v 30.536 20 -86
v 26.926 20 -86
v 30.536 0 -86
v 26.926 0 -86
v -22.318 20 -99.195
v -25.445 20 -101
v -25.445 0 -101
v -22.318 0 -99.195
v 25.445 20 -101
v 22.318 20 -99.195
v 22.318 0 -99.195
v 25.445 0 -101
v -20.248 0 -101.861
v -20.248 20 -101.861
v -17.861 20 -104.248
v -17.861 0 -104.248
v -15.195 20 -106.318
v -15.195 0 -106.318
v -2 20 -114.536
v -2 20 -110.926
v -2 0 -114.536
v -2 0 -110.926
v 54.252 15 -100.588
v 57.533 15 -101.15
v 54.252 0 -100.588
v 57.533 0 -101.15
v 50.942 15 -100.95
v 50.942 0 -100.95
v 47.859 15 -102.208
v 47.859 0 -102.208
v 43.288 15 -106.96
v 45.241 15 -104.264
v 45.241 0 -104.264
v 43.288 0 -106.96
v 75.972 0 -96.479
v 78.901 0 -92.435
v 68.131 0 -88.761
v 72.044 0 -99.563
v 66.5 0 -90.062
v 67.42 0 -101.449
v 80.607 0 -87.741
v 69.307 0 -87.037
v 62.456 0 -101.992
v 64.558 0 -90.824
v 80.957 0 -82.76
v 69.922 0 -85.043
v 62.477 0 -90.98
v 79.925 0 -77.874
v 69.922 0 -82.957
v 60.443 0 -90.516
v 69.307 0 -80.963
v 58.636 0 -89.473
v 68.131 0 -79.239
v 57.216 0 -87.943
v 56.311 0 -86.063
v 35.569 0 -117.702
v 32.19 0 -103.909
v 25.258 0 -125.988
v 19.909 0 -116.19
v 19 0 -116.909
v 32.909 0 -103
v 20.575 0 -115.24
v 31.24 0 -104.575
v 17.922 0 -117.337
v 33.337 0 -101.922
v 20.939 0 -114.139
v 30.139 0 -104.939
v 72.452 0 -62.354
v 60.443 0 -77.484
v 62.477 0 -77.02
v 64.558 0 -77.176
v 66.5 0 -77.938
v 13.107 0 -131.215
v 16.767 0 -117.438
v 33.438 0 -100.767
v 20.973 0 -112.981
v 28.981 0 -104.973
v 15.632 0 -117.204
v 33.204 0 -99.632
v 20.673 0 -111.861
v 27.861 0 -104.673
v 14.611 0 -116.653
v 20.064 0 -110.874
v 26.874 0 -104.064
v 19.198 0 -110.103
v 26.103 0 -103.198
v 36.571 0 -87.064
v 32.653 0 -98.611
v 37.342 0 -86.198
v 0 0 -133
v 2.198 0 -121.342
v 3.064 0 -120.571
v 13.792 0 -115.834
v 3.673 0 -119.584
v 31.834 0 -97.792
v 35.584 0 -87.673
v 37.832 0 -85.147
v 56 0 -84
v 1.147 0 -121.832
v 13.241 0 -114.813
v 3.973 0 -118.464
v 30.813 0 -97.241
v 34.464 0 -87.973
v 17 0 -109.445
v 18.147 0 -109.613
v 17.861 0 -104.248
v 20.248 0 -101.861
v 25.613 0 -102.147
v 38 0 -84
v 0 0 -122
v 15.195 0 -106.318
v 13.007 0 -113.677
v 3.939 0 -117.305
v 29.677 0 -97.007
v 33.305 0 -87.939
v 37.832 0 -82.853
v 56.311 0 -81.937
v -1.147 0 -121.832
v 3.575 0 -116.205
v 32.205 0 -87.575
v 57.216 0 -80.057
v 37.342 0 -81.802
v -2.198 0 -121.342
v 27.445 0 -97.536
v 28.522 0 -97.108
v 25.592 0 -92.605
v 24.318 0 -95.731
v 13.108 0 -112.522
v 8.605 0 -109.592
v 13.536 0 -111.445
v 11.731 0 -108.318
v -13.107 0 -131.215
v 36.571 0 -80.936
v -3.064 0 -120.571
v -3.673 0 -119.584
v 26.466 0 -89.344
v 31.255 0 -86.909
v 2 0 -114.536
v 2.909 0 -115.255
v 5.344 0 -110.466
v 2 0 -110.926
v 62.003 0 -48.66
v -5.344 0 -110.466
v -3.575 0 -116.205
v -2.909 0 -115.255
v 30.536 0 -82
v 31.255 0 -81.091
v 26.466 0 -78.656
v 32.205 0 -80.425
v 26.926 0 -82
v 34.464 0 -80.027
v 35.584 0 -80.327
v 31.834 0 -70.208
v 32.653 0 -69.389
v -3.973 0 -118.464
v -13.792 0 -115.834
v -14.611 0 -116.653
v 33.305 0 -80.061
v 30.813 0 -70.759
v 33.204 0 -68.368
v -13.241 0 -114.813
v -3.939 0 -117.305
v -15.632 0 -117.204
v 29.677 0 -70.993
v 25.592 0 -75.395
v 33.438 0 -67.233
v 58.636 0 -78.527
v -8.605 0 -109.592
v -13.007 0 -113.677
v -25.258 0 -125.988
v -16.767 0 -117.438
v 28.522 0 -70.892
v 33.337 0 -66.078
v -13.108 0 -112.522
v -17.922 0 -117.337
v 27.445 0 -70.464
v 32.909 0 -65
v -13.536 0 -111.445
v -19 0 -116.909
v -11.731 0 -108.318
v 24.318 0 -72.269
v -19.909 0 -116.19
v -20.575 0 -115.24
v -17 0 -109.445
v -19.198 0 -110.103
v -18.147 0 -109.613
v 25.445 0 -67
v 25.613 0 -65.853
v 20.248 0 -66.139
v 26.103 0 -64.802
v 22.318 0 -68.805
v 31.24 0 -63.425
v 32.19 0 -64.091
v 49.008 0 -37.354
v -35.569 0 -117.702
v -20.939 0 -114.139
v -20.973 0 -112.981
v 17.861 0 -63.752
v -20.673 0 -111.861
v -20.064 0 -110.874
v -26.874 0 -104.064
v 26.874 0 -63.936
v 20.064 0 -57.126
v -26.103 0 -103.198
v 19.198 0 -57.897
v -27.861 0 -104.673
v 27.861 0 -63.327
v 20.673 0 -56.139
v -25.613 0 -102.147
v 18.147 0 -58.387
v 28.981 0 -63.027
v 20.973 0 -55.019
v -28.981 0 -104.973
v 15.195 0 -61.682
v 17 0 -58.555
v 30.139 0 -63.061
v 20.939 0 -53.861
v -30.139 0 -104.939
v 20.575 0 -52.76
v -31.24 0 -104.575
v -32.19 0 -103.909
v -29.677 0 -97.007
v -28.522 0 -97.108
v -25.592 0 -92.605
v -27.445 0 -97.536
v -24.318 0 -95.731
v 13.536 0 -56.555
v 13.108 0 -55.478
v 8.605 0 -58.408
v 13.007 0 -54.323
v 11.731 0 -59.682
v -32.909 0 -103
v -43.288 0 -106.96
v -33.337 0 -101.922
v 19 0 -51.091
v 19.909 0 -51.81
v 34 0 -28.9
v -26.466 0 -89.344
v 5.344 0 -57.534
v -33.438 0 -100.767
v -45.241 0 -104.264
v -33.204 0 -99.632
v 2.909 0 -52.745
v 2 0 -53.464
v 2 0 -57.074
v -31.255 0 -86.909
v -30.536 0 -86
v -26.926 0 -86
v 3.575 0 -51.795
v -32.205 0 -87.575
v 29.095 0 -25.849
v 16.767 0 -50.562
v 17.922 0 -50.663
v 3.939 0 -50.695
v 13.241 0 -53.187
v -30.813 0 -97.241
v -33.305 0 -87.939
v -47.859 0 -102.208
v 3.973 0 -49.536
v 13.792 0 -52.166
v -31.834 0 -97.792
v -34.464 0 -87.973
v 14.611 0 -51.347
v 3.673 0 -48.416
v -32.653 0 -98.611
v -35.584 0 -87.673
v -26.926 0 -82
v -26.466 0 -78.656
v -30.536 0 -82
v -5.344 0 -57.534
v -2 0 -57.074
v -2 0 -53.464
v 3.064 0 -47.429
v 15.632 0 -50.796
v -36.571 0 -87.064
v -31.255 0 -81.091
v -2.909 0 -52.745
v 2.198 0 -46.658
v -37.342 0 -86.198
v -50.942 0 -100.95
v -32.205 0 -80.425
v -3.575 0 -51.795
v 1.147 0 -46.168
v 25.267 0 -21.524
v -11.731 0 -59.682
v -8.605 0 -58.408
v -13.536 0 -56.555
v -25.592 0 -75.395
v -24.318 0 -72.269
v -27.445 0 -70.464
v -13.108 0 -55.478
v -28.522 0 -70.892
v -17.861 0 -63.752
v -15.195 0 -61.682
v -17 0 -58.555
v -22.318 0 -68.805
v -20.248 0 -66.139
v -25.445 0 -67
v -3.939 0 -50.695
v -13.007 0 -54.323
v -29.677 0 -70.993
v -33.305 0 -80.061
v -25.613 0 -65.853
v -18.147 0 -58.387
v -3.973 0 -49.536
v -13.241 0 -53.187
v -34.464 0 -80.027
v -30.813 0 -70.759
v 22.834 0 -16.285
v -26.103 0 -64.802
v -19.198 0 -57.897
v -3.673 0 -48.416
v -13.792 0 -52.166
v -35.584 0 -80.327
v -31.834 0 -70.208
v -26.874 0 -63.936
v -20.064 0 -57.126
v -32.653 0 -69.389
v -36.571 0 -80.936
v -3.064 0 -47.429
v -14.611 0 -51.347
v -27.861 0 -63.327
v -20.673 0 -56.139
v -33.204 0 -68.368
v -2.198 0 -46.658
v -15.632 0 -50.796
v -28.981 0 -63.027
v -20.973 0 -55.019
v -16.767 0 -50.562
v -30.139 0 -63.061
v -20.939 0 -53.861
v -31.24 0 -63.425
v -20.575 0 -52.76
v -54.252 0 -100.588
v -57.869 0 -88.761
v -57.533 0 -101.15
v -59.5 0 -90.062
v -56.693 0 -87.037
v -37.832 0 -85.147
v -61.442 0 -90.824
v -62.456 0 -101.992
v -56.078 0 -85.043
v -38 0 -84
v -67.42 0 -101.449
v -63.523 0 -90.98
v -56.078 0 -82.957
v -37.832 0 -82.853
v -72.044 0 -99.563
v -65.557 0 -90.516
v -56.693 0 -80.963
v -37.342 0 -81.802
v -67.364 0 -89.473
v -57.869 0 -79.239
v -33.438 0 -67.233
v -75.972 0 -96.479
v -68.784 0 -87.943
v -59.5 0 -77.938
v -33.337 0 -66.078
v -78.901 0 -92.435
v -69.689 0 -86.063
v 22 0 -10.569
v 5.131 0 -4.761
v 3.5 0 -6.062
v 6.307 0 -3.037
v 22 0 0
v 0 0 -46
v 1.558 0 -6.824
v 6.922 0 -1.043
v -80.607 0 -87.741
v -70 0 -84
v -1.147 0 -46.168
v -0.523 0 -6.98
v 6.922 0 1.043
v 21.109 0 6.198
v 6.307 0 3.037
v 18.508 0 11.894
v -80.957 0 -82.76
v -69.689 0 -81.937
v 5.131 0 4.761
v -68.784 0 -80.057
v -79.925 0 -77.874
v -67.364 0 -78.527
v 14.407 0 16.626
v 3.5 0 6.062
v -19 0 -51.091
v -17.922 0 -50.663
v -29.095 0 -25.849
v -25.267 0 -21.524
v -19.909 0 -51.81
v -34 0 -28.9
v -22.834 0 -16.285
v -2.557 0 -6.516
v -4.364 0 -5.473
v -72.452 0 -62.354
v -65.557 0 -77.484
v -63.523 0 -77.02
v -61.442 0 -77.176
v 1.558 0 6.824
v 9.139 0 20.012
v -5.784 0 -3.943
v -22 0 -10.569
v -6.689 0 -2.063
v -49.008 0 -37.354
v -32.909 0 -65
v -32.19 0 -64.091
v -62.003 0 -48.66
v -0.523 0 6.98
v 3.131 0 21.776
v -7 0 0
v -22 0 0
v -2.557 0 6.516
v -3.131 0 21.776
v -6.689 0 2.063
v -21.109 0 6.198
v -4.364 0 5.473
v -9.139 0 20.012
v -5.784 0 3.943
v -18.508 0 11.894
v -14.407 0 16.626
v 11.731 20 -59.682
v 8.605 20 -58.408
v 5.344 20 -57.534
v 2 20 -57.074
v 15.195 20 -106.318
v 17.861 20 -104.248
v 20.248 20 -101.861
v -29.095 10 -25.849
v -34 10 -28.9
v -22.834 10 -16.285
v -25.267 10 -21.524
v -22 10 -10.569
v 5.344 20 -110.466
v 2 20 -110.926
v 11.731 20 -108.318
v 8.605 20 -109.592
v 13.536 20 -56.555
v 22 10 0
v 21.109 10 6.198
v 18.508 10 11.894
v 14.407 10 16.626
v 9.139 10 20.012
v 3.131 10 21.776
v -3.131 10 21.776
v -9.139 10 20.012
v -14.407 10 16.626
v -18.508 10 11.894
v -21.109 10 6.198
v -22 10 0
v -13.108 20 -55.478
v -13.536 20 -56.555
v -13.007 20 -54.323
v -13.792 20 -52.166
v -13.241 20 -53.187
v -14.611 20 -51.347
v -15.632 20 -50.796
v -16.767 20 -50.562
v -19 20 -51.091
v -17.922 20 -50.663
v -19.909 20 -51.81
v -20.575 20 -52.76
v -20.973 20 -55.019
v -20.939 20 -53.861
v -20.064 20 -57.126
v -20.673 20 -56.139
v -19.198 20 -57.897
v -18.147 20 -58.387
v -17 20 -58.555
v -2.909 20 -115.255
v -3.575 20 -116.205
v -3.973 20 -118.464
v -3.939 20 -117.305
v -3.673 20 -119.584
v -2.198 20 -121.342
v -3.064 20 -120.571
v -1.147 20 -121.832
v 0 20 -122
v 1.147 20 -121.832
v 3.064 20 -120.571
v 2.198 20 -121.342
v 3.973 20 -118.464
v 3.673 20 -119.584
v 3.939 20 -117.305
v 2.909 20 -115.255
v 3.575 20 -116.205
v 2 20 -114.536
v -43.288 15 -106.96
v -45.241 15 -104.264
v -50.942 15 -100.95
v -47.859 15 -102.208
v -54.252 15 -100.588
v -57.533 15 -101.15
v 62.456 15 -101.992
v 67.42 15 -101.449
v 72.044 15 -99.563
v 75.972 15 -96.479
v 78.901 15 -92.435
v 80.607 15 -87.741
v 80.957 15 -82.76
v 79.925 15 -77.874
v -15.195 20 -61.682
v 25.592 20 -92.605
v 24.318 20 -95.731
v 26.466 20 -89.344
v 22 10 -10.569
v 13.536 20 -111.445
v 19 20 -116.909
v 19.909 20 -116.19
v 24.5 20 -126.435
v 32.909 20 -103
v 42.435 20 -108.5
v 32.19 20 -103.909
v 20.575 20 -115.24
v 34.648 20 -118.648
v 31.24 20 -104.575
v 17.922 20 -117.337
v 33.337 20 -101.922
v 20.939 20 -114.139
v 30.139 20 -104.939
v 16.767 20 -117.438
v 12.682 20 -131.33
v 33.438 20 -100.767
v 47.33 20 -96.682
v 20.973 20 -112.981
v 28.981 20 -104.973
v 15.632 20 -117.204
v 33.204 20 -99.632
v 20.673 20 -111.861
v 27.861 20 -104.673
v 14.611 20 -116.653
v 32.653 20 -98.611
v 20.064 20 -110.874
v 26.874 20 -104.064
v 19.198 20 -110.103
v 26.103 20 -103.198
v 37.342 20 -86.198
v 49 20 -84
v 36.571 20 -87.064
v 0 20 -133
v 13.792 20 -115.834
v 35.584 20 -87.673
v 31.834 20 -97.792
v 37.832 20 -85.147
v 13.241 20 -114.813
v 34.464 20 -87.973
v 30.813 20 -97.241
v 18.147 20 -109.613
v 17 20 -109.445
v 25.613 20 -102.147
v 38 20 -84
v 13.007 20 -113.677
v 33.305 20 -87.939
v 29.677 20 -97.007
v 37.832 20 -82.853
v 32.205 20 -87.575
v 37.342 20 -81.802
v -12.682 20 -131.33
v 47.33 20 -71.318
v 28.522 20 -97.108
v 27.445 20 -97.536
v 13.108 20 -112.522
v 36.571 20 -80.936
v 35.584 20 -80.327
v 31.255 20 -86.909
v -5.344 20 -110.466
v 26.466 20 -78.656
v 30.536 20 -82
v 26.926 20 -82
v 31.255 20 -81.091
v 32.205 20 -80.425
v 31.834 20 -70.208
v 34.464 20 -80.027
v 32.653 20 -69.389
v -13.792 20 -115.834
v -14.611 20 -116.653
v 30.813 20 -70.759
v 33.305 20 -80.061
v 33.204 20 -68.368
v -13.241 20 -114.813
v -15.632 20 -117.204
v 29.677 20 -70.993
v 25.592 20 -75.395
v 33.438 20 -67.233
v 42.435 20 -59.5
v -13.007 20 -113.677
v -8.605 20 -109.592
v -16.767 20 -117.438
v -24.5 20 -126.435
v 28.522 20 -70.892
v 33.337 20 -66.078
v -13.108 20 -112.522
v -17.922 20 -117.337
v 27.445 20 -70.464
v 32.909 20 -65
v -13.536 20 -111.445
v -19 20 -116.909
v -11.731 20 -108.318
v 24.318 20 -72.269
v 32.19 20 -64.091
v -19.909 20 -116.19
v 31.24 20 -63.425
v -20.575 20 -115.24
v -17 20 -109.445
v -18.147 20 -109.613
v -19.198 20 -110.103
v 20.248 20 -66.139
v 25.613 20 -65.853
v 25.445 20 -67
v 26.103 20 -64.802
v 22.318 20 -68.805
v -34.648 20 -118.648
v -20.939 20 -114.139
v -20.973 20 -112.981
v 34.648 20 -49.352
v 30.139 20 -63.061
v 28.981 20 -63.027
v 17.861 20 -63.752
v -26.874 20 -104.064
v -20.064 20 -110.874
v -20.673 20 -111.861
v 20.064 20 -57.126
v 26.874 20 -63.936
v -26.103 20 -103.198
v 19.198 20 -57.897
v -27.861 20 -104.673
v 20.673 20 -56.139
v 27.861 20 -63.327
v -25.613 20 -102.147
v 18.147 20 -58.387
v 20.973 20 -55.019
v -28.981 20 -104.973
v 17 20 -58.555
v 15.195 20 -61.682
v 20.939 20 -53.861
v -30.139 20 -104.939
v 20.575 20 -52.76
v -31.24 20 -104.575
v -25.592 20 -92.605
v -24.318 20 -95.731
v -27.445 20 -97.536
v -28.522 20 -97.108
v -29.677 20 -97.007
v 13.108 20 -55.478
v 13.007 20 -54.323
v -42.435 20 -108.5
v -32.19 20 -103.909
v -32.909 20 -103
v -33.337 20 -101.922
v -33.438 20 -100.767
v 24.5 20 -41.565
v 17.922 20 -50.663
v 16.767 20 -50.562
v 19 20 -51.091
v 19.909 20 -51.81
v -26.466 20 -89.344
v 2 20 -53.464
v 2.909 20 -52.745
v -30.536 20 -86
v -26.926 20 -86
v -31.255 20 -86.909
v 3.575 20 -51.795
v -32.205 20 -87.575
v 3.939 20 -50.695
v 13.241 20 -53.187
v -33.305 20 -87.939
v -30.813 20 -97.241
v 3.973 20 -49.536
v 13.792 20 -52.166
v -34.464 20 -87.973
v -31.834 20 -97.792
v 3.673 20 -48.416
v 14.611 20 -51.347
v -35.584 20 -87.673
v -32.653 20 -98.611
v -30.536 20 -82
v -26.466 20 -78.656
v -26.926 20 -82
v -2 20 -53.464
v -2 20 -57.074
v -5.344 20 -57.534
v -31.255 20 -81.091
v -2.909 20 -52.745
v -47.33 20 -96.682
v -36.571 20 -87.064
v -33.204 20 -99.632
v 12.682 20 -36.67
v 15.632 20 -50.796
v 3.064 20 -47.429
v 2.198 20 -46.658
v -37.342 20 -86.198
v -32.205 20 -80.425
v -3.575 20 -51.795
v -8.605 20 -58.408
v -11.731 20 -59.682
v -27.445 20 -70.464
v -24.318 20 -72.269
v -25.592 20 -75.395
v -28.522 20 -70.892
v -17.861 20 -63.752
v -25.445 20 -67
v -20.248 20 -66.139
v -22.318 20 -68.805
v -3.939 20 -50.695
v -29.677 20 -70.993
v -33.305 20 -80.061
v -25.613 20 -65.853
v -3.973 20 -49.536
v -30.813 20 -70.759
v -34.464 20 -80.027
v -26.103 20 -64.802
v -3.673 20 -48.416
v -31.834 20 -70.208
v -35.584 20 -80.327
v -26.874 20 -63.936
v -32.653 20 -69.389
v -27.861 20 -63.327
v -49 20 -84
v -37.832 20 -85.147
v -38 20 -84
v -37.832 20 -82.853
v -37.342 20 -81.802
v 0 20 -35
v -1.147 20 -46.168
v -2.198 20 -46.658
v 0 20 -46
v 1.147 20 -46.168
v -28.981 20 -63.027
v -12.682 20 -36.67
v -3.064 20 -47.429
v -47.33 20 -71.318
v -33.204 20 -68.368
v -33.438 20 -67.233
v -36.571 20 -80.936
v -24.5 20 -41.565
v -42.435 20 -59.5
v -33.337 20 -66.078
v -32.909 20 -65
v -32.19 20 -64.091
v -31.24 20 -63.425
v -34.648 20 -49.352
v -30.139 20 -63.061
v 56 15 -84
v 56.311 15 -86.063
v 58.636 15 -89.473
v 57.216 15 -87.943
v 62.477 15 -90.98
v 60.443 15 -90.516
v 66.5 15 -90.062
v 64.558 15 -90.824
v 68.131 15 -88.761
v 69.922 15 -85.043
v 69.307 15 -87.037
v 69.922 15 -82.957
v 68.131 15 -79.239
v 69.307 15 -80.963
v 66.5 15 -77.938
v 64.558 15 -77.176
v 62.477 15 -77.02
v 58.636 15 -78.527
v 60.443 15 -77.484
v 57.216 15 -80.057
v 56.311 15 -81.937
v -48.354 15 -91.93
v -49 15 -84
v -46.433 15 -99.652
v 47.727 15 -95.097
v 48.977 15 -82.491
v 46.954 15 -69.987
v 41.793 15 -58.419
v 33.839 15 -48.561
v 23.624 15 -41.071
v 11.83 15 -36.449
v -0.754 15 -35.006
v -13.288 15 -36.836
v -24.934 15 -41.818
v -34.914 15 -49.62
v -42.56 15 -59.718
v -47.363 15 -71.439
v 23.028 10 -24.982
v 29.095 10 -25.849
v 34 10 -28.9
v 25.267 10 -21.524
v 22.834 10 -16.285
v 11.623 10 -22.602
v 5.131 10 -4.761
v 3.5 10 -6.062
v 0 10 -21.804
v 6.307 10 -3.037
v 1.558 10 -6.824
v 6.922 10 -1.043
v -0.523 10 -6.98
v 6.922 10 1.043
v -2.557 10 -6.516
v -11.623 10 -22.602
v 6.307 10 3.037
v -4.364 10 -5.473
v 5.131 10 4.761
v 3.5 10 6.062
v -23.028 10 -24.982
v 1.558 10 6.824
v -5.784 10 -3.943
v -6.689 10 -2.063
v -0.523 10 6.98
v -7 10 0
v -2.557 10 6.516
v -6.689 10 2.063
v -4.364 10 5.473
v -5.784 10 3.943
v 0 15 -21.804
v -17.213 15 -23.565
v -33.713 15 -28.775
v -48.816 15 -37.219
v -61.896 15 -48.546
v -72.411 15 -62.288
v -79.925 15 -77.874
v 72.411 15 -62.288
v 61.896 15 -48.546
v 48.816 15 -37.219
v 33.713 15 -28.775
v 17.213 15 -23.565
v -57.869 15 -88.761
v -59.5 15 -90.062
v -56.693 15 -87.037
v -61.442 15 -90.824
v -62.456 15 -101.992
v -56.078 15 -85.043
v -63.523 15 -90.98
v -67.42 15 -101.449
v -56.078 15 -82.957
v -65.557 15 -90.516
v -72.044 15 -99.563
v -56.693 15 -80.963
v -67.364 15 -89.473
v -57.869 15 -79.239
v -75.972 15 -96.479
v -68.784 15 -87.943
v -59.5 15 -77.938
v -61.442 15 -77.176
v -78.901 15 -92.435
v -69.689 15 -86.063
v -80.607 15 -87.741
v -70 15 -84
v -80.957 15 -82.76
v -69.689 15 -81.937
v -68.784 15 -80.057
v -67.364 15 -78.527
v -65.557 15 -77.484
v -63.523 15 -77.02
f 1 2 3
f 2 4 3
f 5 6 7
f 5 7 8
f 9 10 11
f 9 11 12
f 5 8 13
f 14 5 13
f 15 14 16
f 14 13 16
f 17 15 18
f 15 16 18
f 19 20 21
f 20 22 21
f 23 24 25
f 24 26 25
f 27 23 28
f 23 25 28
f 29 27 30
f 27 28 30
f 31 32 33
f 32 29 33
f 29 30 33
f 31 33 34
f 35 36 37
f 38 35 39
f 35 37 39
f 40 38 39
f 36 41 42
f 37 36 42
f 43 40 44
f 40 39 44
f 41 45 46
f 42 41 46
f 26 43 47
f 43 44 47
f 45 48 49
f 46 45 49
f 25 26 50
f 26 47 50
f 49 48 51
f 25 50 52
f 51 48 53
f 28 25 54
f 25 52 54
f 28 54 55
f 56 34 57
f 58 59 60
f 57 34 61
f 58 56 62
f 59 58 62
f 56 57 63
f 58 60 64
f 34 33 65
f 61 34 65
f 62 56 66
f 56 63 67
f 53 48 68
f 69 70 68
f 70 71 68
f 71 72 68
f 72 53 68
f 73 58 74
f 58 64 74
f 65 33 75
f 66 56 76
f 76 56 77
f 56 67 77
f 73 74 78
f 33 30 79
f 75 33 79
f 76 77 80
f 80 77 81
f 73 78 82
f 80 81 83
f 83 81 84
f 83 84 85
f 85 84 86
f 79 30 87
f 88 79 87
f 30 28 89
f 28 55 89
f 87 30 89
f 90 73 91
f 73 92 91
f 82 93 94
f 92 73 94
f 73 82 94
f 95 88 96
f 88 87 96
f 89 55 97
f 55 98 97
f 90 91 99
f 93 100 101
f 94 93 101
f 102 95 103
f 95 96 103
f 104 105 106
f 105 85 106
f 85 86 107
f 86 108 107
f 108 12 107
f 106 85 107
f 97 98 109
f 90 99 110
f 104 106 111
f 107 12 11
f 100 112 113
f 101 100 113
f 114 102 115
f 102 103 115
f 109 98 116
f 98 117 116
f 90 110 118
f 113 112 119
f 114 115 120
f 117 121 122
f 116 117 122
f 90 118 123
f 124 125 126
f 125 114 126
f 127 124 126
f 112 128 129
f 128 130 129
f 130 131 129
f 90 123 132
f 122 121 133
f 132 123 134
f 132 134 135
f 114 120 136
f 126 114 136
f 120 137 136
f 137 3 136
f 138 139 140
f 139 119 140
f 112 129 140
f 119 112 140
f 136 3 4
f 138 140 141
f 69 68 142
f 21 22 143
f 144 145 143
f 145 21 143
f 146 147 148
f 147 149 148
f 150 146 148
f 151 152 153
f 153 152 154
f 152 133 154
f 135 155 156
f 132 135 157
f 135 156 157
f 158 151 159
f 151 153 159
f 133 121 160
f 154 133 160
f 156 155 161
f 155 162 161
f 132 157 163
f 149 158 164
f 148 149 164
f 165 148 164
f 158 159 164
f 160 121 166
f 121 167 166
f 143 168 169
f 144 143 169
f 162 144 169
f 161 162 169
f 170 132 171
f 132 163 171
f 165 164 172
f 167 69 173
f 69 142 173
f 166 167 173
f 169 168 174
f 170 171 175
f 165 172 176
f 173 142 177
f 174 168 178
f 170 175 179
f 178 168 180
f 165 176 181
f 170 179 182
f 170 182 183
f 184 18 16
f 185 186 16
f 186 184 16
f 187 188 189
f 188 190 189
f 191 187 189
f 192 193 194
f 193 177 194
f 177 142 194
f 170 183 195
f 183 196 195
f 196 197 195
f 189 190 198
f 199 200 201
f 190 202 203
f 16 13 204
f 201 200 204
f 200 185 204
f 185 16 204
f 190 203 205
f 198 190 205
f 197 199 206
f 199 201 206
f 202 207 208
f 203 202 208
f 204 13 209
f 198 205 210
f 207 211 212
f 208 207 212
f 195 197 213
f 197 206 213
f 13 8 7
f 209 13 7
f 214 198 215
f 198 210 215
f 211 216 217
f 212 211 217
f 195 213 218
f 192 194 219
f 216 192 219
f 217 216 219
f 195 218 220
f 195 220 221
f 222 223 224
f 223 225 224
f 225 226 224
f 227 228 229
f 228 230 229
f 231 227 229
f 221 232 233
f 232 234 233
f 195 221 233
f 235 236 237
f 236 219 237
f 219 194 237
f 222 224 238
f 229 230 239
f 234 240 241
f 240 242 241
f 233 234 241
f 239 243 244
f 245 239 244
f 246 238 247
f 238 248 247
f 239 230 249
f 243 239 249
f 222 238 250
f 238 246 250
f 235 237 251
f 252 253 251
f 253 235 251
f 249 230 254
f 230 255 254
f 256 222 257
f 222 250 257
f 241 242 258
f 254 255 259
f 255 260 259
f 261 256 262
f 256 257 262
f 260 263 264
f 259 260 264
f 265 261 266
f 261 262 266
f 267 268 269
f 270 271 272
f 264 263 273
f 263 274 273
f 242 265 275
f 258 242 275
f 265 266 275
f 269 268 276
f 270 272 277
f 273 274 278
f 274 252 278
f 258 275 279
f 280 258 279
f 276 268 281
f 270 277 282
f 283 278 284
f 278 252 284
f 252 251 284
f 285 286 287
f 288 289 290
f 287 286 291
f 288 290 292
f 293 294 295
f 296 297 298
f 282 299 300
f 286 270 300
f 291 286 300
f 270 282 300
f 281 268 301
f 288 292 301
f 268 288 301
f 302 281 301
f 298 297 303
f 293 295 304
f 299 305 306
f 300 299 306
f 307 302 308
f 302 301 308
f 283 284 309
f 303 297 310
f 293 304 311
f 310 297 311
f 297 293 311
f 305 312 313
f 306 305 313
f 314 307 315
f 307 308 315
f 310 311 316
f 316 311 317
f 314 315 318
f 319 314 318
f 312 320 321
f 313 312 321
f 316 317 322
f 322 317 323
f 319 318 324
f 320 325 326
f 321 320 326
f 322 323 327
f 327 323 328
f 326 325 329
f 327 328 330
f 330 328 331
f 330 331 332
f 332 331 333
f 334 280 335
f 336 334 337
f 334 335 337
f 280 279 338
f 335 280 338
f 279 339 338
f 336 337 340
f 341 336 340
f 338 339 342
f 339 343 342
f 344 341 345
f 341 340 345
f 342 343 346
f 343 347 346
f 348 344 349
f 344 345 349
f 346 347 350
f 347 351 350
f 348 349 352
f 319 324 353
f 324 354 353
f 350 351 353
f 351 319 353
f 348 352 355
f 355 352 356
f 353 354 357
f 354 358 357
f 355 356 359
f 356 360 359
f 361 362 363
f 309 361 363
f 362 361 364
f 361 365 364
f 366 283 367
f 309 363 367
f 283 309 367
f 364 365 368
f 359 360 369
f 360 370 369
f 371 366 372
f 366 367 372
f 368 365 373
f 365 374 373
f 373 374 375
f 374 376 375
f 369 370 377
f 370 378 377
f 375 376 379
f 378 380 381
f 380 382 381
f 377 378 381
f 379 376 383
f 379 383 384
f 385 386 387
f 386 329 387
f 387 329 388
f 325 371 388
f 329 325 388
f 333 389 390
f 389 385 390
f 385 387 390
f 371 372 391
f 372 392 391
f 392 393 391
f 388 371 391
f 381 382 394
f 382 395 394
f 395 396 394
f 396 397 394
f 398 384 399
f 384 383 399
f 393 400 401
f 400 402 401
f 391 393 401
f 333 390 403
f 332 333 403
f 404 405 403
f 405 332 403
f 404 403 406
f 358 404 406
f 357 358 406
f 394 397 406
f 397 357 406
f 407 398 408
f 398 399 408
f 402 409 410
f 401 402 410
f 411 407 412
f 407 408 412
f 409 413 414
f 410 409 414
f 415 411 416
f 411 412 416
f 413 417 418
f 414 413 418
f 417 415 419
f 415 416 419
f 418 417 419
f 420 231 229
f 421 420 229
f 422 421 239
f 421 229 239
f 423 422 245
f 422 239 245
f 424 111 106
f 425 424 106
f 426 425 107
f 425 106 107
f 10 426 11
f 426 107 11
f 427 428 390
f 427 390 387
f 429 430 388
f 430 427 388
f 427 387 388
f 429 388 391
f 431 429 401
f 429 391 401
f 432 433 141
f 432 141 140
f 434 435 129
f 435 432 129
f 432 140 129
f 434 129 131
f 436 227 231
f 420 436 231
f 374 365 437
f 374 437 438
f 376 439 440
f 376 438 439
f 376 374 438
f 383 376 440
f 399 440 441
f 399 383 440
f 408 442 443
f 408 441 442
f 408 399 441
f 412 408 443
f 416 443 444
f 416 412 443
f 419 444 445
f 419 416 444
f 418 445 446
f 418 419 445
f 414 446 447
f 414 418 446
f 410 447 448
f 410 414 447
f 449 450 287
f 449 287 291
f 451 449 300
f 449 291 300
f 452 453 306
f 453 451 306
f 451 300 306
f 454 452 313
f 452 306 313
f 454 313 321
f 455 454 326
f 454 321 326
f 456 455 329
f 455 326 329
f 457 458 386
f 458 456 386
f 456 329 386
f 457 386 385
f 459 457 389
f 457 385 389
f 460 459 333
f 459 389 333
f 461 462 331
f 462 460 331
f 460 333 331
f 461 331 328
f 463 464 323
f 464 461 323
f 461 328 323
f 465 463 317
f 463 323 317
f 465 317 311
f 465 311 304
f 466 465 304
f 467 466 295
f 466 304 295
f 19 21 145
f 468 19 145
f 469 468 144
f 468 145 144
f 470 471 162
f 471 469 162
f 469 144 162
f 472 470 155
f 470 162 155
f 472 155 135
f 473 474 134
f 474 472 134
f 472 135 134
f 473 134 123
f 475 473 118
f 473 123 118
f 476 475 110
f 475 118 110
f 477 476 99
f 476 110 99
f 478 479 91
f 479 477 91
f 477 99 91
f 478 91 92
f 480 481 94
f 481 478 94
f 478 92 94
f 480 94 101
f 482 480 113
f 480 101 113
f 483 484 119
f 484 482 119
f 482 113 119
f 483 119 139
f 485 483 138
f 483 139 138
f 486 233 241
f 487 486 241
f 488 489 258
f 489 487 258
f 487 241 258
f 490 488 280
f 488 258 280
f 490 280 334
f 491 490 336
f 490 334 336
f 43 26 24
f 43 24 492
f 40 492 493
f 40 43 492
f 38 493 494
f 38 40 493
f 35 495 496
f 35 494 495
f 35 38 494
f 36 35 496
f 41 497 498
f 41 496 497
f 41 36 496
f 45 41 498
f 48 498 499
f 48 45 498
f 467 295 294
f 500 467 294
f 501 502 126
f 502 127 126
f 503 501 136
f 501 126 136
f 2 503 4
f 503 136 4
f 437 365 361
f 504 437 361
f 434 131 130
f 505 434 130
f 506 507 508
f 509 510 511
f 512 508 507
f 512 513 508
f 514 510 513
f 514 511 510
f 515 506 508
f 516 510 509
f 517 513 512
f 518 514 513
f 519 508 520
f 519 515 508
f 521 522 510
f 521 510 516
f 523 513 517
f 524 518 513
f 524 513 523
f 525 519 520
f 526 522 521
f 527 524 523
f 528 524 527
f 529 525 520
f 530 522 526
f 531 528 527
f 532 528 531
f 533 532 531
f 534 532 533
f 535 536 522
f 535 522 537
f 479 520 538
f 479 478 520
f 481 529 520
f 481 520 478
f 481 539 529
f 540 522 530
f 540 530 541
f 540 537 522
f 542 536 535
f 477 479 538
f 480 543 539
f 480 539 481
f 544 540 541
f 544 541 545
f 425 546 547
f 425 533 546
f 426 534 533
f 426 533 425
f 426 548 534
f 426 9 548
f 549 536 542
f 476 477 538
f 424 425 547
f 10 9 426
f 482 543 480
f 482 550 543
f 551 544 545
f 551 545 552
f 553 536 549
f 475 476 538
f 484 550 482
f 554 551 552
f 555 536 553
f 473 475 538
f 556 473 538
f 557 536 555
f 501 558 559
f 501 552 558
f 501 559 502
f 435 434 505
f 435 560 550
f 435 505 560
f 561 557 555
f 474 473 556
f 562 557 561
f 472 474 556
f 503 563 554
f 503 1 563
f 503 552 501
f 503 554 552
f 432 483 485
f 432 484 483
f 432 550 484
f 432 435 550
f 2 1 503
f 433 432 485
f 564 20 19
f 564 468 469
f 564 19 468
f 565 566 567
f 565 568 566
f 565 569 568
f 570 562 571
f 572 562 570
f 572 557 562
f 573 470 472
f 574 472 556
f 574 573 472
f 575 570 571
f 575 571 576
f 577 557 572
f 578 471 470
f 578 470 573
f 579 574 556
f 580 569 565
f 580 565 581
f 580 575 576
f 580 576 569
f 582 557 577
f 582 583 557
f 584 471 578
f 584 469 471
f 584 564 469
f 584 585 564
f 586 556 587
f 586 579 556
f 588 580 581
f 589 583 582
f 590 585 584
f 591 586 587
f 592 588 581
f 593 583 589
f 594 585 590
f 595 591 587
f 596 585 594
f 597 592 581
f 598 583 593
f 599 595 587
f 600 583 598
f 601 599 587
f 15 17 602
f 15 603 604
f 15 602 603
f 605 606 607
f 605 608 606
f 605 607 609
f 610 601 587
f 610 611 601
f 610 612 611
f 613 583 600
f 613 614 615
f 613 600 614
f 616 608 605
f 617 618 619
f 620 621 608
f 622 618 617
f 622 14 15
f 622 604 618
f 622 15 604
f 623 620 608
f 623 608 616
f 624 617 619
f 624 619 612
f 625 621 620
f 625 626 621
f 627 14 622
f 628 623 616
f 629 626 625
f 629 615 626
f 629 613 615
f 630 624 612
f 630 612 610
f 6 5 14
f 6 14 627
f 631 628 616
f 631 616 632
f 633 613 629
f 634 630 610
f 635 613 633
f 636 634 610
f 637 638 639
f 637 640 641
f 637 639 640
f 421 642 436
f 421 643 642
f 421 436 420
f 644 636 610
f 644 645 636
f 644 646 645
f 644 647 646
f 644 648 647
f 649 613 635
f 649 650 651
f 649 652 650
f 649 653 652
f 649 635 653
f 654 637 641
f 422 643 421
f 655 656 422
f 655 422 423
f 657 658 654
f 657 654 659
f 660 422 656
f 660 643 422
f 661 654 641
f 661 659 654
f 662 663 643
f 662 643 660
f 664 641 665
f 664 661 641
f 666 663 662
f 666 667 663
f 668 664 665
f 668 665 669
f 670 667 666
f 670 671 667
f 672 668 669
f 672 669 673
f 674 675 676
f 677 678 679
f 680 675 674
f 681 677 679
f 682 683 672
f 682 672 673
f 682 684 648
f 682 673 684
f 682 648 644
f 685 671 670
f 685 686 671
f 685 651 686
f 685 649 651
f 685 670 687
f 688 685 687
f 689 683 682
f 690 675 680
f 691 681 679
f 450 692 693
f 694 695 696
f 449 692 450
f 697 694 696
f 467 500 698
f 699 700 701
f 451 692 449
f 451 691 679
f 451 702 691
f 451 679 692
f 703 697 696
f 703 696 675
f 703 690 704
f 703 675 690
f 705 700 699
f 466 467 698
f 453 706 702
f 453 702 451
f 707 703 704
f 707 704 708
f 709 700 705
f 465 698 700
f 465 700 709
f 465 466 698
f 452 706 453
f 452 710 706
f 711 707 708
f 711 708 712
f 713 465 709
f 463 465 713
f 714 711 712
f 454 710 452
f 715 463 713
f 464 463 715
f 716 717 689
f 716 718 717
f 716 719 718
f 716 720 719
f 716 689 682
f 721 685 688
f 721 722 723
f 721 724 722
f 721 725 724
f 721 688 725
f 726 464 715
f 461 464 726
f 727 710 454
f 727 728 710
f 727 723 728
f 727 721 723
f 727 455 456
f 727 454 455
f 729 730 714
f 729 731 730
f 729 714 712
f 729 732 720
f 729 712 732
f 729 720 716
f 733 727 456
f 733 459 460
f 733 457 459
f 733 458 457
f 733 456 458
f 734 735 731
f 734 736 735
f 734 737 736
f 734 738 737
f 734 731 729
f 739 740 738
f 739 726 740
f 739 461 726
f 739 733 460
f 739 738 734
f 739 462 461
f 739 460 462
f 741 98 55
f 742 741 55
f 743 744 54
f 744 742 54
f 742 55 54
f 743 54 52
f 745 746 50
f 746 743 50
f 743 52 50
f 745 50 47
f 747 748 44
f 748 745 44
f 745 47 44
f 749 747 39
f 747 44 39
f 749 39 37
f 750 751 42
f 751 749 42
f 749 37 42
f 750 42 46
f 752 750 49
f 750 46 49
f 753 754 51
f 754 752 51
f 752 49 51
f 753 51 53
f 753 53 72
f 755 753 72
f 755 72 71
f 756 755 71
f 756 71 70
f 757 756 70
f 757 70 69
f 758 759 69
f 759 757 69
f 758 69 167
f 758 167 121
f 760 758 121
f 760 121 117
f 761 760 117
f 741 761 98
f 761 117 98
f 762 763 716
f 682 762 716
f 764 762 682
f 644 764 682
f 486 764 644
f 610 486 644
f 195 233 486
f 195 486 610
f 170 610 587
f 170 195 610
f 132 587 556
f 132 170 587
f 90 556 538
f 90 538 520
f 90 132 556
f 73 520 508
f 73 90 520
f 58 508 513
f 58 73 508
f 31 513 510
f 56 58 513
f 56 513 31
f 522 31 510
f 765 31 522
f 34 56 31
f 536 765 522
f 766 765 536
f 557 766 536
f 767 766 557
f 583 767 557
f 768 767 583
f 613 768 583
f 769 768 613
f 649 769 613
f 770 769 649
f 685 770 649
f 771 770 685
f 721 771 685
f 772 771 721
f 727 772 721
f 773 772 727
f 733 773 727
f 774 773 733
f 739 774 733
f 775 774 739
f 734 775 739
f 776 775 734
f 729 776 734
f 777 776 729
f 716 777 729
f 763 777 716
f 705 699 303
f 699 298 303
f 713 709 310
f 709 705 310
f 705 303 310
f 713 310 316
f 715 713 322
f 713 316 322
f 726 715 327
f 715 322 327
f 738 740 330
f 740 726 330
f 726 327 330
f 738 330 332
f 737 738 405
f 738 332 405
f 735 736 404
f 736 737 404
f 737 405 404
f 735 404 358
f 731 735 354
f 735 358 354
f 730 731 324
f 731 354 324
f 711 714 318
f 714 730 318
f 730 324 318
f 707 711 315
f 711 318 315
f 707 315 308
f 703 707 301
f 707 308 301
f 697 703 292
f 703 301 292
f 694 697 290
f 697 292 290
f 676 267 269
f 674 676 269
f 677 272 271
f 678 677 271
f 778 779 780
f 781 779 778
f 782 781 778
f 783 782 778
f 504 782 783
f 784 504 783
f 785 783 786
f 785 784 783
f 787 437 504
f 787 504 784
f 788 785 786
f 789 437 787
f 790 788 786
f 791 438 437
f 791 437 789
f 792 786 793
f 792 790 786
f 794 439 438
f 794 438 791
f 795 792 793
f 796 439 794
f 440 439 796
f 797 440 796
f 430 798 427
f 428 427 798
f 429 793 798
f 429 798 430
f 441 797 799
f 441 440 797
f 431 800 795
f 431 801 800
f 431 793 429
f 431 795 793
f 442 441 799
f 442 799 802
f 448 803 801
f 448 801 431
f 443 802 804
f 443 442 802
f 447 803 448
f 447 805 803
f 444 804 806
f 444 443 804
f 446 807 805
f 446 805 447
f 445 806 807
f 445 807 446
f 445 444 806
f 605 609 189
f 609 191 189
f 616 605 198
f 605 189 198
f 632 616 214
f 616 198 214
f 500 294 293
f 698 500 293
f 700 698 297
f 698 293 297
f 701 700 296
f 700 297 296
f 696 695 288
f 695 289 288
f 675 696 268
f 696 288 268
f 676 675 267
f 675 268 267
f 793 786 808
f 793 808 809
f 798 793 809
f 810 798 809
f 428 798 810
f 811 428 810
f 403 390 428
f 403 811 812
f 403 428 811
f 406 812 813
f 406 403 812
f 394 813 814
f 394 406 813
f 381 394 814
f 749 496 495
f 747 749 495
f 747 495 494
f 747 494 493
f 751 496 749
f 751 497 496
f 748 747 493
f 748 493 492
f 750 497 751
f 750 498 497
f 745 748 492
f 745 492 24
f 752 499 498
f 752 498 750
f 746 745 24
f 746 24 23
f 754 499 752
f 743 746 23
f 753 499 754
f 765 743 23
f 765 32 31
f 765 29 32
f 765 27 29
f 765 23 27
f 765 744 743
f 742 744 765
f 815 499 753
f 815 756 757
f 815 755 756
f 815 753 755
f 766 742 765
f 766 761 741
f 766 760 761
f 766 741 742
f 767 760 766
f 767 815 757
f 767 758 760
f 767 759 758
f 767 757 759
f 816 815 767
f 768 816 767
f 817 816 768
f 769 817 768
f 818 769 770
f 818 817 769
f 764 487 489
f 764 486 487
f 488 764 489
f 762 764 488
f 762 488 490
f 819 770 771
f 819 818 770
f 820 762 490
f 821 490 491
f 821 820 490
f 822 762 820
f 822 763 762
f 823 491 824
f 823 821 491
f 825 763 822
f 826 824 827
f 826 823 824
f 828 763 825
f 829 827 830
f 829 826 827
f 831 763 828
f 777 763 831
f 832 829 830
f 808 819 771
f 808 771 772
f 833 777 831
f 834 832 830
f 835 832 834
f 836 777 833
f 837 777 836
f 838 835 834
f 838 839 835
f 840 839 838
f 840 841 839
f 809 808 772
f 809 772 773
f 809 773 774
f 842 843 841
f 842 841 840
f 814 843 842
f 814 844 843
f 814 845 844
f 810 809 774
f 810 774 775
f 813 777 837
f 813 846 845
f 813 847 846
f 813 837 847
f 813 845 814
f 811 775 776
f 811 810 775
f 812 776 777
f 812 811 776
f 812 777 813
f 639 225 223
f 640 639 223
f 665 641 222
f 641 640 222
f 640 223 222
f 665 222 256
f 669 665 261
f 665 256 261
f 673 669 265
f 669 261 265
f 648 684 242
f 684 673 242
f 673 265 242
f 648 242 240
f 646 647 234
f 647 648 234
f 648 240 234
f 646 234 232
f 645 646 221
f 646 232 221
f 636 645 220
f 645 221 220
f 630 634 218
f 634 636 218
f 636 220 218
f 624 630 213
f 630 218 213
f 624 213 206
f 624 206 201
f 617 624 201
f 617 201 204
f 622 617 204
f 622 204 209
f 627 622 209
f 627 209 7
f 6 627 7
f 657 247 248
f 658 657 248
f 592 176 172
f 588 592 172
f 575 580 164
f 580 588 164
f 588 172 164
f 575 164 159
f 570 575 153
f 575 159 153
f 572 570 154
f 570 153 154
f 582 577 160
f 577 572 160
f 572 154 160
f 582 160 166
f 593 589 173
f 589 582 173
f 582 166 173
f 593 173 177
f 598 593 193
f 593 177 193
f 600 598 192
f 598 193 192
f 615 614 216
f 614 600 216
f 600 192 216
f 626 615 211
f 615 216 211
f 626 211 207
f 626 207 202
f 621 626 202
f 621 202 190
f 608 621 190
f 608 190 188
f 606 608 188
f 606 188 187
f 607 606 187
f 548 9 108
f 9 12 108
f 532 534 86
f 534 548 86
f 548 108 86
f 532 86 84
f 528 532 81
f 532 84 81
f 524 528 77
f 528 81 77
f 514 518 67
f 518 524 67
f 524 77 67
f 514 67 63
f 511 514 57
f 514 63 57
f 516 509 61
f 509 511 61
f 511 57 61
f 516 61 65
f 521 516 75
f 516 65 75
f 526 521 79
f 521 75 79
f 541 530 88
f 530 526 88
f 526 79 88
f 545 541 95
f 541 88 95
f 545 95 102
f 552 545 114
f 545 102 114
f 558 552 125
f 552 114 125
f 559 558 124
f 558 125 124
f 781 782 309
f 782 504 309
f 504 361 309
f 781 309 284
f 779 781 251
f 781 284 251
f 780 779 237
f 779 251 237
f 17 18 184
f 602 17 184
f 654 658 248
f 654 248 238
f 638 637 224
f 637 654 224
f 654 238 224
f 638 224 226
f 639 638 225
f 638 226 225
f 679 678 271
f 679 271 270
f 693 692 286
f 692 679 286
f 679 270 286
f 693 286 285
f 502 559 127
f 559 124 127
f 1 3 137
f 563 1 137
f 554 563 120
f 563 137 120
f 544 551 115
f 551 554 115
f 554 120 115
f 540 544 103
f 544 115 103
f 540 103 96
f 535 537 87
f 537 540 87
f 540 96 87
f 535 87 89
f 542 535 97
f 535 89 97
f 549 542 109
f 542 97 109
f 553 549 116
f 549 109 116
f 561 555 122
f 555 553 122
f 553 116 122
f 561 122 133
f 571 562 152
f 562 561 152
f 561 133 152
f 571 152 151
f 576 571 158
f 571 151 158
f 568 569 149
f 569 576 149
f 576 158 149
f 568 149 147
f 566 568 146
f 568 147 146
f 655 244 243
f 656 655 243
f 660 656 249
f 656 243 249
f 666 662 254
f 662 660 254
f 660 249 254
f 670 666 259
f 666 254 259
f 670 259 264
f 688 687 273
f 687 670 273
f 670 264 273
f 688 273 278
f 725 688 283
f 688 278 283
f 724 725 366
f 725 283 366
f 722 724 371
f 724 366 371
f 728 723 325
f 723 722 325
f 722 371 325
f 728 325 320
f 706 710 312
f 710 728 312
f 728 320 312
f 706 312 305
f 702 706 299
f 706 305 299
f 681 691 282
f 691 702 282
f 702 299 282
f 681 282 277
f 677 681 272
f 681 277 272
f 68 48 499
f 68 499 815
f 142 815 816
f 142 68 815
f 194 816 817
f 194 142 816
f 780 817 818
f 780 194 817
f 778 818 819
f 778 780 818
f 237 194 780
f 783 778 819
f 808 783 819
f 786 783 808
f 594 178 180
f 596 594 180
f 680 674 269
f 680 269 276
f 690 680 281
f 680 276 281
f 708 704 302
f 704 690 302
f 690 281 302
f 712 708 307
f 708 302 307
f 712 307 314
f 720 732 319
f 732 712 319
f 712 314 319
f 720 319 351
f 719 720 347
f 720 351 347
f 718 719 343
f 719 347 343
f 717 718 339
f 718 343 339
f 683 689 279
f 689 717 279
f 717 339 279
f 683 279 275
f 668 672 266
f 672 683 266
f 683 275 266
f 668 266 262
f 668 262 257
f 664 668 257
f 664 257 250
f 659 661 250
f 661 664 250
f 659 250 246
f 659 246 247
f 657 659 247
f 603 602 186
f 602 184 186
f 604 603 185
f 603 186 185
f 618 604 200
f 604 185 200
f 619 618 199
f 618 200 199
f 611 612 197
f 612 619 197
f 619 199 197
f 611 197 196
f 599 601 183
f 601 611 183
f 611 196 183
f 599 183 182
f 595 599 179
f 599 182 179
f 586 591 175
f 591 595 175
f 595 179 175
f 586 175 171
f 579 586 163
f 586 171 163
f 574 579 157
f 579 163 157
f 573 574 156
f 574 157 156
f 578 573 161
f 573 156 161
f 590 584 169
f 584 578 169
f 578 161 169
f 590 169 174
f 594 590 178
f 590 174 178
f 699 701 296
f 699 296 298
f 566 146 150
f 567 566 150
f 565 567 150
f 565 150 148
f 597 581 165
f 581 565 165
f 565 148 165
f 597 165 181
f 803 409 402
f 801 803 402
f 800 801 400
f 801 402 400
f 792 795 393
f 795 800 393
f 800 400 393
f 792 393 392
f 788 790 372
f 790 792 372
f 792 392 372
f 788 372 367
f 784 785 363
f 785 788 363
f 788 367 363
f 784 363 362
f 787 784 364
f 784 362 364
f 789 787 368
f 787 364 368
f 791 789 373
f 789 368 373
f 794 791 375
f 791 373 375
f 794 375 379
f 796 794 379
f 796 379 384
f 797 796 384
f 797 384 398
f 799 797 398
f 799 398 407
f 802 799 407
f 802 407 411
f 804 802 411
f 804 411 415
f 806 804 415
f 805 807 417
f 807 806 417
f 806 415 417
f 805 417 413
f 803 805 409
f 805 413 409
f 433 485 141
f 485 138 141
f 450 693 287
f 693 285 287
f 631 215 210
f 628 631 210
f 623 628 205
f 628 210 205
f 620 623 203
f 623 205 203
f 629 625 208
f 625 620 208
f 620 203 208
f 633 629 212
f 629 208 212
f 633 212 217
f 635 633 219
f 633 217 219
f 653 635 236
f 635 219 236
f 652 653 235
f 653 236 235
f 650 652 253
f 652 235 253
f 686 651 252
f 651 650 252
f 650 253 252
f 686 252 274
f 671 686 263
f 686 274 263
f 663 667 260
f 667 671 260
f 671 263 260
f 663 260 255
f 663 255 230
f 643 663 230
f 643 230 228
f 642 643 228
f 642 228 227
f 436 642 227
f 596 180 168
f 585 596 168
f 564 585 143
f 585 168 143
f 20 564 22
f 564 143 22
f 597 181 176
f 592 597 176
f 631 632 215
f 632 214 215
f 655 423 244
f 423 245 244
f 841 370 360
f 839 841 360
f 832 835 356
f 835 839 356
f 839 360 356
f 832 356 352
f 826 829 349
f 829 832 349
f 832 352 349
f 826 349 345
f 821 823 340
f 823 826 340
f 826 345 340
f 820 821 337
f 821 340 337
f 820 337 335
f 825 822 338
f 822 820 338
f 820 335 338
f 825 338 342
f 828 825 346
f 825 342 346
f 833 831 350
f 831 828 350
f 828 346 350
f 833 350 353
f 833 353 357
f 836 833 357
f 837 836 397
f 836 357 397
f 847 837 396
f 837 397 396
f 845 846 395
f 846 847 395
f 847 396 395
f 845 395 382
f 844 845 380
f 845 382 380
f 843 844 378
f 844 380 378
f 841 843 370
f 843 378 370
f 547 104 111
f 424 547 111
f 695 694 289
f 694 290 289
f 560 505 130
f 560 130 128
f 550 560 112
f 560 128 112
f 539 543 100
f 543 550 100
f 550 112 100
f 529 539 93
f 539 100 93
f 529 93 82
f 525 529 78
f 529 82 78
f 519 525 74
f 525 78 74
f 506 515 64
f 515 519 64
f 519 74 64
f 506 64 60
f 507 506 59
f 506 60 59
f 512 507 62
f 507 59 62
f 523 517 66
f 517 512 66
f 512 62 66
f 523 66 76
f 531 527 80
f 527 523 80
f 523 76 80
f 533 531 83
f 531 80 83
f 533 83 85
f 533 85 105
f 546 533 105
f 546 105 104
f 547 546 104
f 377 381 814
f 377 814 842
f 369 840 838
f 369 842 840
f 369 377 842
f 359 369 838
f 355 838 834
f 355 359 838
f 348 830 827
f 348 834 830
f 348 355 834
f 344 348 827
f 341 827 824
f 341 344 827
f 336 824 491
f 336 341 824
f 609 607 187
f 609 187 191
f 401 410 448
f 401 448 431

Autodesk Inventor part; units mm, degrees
ref_plane "YZ Plane" through (0, 0, 0) normal (1, 0, 0) x (0, 1, 0)
ref_plane "XZ Plane" through (0, 0, 0) normal (0, 1, 0) x (-1, 0, 0)
ref_plane "XY Plane" through (0, 0, 0) normal (0, 0, 1) x (1, 0, 0)
sketch "Sketch1" plane through (0, 0, 0) normal (0, 1, 0) x (-1, 0, 0)
  circle A0 centre (0, 0) radius 7
  arc A1 (22, 0) -> (-22, 0) centre (0, 0) ccw
  line L0 (0, 0) -> (0, -84) construction
  circle A2 centre (0, -84) radius 49
  arc A3 (30.5359, -86) -> (30.5359, -82) centre (34, -84) ccw
  line L1 (26.9258, -82) -> (30.5359, -82)
  line L2 (30.5359, -86) -> (26.9258, -86)
  line L3 (26.9258, -82) -> (30.5359, -86) construction
  line L4 (30.5359, -82) -> (26.9258, -86) construction
  line L5 (27.4449, -70.4641) -> (24.3184, -72.2691)
  arc A4 (27.4449, -70.4641) -> (25.4449, -67) centre (29.4449, -67) ccw
  line L6 (22.3184, -68.805) -> (25.4449, -67)
  line L7 (17, -58.5551) -> (15.195, -61.6816)
  arc A5 (17, -58.5551) -> (13.5359, -56.5551) centre (17, -54.5551) ccw
  line L8 (11.7309, -59.6816) -> (13.5359, -56.5551)
  line L9 (2, -53.4641) -> (2, -57.0742)
  arc A6 (2, -53.4641) -> (-2, -53.4641) centre (0, -50) ccw
  line L10 (-2, -57.0742) -> (-2, -53.4641)
  line L11 (-13.5359, -56.5551) -> (-11.7309, -59.6816)
  arc A7 (-13.5359, -56.5551) -> (-17, -58.5551) centre (-17, -54.5551) ccw
  line L12 (-15.195, -61.6816) -> (-17, -58.5551)
  line L13 (-25.4449, -67) -> (-22.3184, -68.805)
  arc A8 (-25.4449, -67) -> (-27.4449, -70.4641) centre (-29.4449, -67) ccw
  line L14 (-24.3184, -72.2691) -> (-27.4449, -70.4641)
  line L15 (-30.5359, -82) -> (-26.9258, -82)
  arc A9 (-30.5359, -82) -> (-30.5359, -86) centre (-34, -84) ccw
  line L16 (-26.9258, -86) -> (-30.5359, -86)
  line L17 (-27.4449, -97.5359) -> (-24.3184, -95.7309)
  arc A10 (-27.4449, -97.5359) -> (-25.4449, -101) centre (-29.4449, -101) ccw
  line L18 (-22.3184, -99.195) -> (-25.4449, -101)
  line L19 (-17, -109.4449) -> (-15.195, -106.3184)
  arc A11 (-17, -109.4449) -> (-13.5359, -111.4449) centre (-17, -113.4449) ccw
  line L20 (-11.7309, -108.3184) -> (-13.5359, -111.4449)
  line L21 (-2, -114.5359) -> (-2, -110.9258)
  arc A12 (-2, -114.5359) -> (2, -114.5359) centre (0, -118) ccw
  line L22 (2, -110.9258) -> (2, -114.5359)
  line L23 (13.5359, -111.4449) -> (11.7309, -108.3184)
  arc A13 (13.5359, -111.4449) -> (17, -109.4449) centre (17, -113.4449) ccw
  line L24 (15.195, -106.3184) -> (17, -109.4449)
  line L25 (25.4449, -101) -> (22.3184, -99.195)
  arc A14 (25.4449, -101) -> (27.4449, -97.5359) centre (29.4449, -101) ccw
  line L26 (24.3184, -95.7309) -> (27.4449, -97.5359)
  circle A15 centre (63, -84) radius 7
  arc A16 (57.5333, -101.1498) -> (79.9254, -77.8737) centre (63, -84) ccw
  arc A17 (57.5333, -101.1498) -> (43.2878, -106.9601) centre (53.8889, -112.583) ccw
  arc A18 (79.9254, -77.8737) -> (0, -21.8035) centre (0, -106.8035) ccw
  line L27 (22, 0) -> (22, -10.5694)
  arc A19 (22, -10.5694) -> (34, -28.8997) centre (42, -10.5694) ccw
  circle A20 centre (-63, -84) radius 7
  arc A21 (-79.9254, -77.8737) -> (-57.5333, -101.1498) centre (-63, -84) ccw
  arc A22 (-43.2878, -106.9601) -> (-57.5333, -101.1498) centre (-53.8889, -112.583) ccw
  arc A23 (0, -21.8035) -> (-79.9254, -77.8737) centre (0, -106.8035) ccw
  line L28 (-22, 0) -> (-22, -10.5694)
  arc A24 (-34, -28.8997) -> (-22, -10.5694) centre (-42, -10.5694) ccw
  arc A25 (24.3184, -95.7309) -> (26.9258, -86) centre (0, -84) ccw
  arc A26 (15.195, -106.3184) -> (22.3184, -99.195) centre (0, -84) ccw
  arc A27 (2, -110.9258) -> (11.7309, -108.3184) centre (0, -84) ccw
  arc A28 (-11.7309, -108.3184) -> (-2, -110.9258) centre (0, -84) ccw
  arc A29 (-22.3184, -99.195) -> (-15.195, -106.3184) centre (0, -84) ccw
  arc A30 (-26.9258, -86) -> (-24.3184, -95.7309) centre (0, -84) ccw
  arc A31 (-24.3184, -72.2691) -> (-26.9258, -82) centre (0, -84) ccw
  arc A32 (-15.195, -61.6816) -> (-22.3184, -68.805) centre (0, -84) ccw
  arc A33 (-2, -57.0742) -> (-11.7309, -59.6816) centre (0, -84) ccw
  arc A34 (11.7309, -59.6816) -> (2, -57.0742) centre (0, -84) ccw
  arc A35 (26.9258, -82) -> (24.3184, -72.2691) centre (0, -84) ccw
  arc A36 (22.3184, -68.805) -> (15.195, -61.6816) centre (0, -84) ccw
  point P0 (28.7309, -84)
  point P1 (-43.2878, -106.9601)
  dimension "d4" = 98
  dimension "d0" = 14
  dimension "d1" = 22
  dimension "d2" = 84
  dimension "d5" = 8
  dimension "d6" = 34
  dimension "d8" = 4
  dimension "d11" = 360
  dimension "d14" = 63
  dimension "d15" = 18
  dimension "d16" = 12
  dimension "d17" = 85
  dimension "d19" = 20
  dimension "d20" = 54
extrude "Extrusion1" add sketch "Sketch1" along normal blind 10 contours L27 A19 A18 A23 A24 L28 A1
extrude "Extrusion2" add sketch "Sketch1" along normal blind 15 contours A18 A16 A17 A2 A22 A21 A23
extrude "Extrusion3" add sketch "Sketch1" along normal blind 20 contours A2
properties part number "Roseta"
